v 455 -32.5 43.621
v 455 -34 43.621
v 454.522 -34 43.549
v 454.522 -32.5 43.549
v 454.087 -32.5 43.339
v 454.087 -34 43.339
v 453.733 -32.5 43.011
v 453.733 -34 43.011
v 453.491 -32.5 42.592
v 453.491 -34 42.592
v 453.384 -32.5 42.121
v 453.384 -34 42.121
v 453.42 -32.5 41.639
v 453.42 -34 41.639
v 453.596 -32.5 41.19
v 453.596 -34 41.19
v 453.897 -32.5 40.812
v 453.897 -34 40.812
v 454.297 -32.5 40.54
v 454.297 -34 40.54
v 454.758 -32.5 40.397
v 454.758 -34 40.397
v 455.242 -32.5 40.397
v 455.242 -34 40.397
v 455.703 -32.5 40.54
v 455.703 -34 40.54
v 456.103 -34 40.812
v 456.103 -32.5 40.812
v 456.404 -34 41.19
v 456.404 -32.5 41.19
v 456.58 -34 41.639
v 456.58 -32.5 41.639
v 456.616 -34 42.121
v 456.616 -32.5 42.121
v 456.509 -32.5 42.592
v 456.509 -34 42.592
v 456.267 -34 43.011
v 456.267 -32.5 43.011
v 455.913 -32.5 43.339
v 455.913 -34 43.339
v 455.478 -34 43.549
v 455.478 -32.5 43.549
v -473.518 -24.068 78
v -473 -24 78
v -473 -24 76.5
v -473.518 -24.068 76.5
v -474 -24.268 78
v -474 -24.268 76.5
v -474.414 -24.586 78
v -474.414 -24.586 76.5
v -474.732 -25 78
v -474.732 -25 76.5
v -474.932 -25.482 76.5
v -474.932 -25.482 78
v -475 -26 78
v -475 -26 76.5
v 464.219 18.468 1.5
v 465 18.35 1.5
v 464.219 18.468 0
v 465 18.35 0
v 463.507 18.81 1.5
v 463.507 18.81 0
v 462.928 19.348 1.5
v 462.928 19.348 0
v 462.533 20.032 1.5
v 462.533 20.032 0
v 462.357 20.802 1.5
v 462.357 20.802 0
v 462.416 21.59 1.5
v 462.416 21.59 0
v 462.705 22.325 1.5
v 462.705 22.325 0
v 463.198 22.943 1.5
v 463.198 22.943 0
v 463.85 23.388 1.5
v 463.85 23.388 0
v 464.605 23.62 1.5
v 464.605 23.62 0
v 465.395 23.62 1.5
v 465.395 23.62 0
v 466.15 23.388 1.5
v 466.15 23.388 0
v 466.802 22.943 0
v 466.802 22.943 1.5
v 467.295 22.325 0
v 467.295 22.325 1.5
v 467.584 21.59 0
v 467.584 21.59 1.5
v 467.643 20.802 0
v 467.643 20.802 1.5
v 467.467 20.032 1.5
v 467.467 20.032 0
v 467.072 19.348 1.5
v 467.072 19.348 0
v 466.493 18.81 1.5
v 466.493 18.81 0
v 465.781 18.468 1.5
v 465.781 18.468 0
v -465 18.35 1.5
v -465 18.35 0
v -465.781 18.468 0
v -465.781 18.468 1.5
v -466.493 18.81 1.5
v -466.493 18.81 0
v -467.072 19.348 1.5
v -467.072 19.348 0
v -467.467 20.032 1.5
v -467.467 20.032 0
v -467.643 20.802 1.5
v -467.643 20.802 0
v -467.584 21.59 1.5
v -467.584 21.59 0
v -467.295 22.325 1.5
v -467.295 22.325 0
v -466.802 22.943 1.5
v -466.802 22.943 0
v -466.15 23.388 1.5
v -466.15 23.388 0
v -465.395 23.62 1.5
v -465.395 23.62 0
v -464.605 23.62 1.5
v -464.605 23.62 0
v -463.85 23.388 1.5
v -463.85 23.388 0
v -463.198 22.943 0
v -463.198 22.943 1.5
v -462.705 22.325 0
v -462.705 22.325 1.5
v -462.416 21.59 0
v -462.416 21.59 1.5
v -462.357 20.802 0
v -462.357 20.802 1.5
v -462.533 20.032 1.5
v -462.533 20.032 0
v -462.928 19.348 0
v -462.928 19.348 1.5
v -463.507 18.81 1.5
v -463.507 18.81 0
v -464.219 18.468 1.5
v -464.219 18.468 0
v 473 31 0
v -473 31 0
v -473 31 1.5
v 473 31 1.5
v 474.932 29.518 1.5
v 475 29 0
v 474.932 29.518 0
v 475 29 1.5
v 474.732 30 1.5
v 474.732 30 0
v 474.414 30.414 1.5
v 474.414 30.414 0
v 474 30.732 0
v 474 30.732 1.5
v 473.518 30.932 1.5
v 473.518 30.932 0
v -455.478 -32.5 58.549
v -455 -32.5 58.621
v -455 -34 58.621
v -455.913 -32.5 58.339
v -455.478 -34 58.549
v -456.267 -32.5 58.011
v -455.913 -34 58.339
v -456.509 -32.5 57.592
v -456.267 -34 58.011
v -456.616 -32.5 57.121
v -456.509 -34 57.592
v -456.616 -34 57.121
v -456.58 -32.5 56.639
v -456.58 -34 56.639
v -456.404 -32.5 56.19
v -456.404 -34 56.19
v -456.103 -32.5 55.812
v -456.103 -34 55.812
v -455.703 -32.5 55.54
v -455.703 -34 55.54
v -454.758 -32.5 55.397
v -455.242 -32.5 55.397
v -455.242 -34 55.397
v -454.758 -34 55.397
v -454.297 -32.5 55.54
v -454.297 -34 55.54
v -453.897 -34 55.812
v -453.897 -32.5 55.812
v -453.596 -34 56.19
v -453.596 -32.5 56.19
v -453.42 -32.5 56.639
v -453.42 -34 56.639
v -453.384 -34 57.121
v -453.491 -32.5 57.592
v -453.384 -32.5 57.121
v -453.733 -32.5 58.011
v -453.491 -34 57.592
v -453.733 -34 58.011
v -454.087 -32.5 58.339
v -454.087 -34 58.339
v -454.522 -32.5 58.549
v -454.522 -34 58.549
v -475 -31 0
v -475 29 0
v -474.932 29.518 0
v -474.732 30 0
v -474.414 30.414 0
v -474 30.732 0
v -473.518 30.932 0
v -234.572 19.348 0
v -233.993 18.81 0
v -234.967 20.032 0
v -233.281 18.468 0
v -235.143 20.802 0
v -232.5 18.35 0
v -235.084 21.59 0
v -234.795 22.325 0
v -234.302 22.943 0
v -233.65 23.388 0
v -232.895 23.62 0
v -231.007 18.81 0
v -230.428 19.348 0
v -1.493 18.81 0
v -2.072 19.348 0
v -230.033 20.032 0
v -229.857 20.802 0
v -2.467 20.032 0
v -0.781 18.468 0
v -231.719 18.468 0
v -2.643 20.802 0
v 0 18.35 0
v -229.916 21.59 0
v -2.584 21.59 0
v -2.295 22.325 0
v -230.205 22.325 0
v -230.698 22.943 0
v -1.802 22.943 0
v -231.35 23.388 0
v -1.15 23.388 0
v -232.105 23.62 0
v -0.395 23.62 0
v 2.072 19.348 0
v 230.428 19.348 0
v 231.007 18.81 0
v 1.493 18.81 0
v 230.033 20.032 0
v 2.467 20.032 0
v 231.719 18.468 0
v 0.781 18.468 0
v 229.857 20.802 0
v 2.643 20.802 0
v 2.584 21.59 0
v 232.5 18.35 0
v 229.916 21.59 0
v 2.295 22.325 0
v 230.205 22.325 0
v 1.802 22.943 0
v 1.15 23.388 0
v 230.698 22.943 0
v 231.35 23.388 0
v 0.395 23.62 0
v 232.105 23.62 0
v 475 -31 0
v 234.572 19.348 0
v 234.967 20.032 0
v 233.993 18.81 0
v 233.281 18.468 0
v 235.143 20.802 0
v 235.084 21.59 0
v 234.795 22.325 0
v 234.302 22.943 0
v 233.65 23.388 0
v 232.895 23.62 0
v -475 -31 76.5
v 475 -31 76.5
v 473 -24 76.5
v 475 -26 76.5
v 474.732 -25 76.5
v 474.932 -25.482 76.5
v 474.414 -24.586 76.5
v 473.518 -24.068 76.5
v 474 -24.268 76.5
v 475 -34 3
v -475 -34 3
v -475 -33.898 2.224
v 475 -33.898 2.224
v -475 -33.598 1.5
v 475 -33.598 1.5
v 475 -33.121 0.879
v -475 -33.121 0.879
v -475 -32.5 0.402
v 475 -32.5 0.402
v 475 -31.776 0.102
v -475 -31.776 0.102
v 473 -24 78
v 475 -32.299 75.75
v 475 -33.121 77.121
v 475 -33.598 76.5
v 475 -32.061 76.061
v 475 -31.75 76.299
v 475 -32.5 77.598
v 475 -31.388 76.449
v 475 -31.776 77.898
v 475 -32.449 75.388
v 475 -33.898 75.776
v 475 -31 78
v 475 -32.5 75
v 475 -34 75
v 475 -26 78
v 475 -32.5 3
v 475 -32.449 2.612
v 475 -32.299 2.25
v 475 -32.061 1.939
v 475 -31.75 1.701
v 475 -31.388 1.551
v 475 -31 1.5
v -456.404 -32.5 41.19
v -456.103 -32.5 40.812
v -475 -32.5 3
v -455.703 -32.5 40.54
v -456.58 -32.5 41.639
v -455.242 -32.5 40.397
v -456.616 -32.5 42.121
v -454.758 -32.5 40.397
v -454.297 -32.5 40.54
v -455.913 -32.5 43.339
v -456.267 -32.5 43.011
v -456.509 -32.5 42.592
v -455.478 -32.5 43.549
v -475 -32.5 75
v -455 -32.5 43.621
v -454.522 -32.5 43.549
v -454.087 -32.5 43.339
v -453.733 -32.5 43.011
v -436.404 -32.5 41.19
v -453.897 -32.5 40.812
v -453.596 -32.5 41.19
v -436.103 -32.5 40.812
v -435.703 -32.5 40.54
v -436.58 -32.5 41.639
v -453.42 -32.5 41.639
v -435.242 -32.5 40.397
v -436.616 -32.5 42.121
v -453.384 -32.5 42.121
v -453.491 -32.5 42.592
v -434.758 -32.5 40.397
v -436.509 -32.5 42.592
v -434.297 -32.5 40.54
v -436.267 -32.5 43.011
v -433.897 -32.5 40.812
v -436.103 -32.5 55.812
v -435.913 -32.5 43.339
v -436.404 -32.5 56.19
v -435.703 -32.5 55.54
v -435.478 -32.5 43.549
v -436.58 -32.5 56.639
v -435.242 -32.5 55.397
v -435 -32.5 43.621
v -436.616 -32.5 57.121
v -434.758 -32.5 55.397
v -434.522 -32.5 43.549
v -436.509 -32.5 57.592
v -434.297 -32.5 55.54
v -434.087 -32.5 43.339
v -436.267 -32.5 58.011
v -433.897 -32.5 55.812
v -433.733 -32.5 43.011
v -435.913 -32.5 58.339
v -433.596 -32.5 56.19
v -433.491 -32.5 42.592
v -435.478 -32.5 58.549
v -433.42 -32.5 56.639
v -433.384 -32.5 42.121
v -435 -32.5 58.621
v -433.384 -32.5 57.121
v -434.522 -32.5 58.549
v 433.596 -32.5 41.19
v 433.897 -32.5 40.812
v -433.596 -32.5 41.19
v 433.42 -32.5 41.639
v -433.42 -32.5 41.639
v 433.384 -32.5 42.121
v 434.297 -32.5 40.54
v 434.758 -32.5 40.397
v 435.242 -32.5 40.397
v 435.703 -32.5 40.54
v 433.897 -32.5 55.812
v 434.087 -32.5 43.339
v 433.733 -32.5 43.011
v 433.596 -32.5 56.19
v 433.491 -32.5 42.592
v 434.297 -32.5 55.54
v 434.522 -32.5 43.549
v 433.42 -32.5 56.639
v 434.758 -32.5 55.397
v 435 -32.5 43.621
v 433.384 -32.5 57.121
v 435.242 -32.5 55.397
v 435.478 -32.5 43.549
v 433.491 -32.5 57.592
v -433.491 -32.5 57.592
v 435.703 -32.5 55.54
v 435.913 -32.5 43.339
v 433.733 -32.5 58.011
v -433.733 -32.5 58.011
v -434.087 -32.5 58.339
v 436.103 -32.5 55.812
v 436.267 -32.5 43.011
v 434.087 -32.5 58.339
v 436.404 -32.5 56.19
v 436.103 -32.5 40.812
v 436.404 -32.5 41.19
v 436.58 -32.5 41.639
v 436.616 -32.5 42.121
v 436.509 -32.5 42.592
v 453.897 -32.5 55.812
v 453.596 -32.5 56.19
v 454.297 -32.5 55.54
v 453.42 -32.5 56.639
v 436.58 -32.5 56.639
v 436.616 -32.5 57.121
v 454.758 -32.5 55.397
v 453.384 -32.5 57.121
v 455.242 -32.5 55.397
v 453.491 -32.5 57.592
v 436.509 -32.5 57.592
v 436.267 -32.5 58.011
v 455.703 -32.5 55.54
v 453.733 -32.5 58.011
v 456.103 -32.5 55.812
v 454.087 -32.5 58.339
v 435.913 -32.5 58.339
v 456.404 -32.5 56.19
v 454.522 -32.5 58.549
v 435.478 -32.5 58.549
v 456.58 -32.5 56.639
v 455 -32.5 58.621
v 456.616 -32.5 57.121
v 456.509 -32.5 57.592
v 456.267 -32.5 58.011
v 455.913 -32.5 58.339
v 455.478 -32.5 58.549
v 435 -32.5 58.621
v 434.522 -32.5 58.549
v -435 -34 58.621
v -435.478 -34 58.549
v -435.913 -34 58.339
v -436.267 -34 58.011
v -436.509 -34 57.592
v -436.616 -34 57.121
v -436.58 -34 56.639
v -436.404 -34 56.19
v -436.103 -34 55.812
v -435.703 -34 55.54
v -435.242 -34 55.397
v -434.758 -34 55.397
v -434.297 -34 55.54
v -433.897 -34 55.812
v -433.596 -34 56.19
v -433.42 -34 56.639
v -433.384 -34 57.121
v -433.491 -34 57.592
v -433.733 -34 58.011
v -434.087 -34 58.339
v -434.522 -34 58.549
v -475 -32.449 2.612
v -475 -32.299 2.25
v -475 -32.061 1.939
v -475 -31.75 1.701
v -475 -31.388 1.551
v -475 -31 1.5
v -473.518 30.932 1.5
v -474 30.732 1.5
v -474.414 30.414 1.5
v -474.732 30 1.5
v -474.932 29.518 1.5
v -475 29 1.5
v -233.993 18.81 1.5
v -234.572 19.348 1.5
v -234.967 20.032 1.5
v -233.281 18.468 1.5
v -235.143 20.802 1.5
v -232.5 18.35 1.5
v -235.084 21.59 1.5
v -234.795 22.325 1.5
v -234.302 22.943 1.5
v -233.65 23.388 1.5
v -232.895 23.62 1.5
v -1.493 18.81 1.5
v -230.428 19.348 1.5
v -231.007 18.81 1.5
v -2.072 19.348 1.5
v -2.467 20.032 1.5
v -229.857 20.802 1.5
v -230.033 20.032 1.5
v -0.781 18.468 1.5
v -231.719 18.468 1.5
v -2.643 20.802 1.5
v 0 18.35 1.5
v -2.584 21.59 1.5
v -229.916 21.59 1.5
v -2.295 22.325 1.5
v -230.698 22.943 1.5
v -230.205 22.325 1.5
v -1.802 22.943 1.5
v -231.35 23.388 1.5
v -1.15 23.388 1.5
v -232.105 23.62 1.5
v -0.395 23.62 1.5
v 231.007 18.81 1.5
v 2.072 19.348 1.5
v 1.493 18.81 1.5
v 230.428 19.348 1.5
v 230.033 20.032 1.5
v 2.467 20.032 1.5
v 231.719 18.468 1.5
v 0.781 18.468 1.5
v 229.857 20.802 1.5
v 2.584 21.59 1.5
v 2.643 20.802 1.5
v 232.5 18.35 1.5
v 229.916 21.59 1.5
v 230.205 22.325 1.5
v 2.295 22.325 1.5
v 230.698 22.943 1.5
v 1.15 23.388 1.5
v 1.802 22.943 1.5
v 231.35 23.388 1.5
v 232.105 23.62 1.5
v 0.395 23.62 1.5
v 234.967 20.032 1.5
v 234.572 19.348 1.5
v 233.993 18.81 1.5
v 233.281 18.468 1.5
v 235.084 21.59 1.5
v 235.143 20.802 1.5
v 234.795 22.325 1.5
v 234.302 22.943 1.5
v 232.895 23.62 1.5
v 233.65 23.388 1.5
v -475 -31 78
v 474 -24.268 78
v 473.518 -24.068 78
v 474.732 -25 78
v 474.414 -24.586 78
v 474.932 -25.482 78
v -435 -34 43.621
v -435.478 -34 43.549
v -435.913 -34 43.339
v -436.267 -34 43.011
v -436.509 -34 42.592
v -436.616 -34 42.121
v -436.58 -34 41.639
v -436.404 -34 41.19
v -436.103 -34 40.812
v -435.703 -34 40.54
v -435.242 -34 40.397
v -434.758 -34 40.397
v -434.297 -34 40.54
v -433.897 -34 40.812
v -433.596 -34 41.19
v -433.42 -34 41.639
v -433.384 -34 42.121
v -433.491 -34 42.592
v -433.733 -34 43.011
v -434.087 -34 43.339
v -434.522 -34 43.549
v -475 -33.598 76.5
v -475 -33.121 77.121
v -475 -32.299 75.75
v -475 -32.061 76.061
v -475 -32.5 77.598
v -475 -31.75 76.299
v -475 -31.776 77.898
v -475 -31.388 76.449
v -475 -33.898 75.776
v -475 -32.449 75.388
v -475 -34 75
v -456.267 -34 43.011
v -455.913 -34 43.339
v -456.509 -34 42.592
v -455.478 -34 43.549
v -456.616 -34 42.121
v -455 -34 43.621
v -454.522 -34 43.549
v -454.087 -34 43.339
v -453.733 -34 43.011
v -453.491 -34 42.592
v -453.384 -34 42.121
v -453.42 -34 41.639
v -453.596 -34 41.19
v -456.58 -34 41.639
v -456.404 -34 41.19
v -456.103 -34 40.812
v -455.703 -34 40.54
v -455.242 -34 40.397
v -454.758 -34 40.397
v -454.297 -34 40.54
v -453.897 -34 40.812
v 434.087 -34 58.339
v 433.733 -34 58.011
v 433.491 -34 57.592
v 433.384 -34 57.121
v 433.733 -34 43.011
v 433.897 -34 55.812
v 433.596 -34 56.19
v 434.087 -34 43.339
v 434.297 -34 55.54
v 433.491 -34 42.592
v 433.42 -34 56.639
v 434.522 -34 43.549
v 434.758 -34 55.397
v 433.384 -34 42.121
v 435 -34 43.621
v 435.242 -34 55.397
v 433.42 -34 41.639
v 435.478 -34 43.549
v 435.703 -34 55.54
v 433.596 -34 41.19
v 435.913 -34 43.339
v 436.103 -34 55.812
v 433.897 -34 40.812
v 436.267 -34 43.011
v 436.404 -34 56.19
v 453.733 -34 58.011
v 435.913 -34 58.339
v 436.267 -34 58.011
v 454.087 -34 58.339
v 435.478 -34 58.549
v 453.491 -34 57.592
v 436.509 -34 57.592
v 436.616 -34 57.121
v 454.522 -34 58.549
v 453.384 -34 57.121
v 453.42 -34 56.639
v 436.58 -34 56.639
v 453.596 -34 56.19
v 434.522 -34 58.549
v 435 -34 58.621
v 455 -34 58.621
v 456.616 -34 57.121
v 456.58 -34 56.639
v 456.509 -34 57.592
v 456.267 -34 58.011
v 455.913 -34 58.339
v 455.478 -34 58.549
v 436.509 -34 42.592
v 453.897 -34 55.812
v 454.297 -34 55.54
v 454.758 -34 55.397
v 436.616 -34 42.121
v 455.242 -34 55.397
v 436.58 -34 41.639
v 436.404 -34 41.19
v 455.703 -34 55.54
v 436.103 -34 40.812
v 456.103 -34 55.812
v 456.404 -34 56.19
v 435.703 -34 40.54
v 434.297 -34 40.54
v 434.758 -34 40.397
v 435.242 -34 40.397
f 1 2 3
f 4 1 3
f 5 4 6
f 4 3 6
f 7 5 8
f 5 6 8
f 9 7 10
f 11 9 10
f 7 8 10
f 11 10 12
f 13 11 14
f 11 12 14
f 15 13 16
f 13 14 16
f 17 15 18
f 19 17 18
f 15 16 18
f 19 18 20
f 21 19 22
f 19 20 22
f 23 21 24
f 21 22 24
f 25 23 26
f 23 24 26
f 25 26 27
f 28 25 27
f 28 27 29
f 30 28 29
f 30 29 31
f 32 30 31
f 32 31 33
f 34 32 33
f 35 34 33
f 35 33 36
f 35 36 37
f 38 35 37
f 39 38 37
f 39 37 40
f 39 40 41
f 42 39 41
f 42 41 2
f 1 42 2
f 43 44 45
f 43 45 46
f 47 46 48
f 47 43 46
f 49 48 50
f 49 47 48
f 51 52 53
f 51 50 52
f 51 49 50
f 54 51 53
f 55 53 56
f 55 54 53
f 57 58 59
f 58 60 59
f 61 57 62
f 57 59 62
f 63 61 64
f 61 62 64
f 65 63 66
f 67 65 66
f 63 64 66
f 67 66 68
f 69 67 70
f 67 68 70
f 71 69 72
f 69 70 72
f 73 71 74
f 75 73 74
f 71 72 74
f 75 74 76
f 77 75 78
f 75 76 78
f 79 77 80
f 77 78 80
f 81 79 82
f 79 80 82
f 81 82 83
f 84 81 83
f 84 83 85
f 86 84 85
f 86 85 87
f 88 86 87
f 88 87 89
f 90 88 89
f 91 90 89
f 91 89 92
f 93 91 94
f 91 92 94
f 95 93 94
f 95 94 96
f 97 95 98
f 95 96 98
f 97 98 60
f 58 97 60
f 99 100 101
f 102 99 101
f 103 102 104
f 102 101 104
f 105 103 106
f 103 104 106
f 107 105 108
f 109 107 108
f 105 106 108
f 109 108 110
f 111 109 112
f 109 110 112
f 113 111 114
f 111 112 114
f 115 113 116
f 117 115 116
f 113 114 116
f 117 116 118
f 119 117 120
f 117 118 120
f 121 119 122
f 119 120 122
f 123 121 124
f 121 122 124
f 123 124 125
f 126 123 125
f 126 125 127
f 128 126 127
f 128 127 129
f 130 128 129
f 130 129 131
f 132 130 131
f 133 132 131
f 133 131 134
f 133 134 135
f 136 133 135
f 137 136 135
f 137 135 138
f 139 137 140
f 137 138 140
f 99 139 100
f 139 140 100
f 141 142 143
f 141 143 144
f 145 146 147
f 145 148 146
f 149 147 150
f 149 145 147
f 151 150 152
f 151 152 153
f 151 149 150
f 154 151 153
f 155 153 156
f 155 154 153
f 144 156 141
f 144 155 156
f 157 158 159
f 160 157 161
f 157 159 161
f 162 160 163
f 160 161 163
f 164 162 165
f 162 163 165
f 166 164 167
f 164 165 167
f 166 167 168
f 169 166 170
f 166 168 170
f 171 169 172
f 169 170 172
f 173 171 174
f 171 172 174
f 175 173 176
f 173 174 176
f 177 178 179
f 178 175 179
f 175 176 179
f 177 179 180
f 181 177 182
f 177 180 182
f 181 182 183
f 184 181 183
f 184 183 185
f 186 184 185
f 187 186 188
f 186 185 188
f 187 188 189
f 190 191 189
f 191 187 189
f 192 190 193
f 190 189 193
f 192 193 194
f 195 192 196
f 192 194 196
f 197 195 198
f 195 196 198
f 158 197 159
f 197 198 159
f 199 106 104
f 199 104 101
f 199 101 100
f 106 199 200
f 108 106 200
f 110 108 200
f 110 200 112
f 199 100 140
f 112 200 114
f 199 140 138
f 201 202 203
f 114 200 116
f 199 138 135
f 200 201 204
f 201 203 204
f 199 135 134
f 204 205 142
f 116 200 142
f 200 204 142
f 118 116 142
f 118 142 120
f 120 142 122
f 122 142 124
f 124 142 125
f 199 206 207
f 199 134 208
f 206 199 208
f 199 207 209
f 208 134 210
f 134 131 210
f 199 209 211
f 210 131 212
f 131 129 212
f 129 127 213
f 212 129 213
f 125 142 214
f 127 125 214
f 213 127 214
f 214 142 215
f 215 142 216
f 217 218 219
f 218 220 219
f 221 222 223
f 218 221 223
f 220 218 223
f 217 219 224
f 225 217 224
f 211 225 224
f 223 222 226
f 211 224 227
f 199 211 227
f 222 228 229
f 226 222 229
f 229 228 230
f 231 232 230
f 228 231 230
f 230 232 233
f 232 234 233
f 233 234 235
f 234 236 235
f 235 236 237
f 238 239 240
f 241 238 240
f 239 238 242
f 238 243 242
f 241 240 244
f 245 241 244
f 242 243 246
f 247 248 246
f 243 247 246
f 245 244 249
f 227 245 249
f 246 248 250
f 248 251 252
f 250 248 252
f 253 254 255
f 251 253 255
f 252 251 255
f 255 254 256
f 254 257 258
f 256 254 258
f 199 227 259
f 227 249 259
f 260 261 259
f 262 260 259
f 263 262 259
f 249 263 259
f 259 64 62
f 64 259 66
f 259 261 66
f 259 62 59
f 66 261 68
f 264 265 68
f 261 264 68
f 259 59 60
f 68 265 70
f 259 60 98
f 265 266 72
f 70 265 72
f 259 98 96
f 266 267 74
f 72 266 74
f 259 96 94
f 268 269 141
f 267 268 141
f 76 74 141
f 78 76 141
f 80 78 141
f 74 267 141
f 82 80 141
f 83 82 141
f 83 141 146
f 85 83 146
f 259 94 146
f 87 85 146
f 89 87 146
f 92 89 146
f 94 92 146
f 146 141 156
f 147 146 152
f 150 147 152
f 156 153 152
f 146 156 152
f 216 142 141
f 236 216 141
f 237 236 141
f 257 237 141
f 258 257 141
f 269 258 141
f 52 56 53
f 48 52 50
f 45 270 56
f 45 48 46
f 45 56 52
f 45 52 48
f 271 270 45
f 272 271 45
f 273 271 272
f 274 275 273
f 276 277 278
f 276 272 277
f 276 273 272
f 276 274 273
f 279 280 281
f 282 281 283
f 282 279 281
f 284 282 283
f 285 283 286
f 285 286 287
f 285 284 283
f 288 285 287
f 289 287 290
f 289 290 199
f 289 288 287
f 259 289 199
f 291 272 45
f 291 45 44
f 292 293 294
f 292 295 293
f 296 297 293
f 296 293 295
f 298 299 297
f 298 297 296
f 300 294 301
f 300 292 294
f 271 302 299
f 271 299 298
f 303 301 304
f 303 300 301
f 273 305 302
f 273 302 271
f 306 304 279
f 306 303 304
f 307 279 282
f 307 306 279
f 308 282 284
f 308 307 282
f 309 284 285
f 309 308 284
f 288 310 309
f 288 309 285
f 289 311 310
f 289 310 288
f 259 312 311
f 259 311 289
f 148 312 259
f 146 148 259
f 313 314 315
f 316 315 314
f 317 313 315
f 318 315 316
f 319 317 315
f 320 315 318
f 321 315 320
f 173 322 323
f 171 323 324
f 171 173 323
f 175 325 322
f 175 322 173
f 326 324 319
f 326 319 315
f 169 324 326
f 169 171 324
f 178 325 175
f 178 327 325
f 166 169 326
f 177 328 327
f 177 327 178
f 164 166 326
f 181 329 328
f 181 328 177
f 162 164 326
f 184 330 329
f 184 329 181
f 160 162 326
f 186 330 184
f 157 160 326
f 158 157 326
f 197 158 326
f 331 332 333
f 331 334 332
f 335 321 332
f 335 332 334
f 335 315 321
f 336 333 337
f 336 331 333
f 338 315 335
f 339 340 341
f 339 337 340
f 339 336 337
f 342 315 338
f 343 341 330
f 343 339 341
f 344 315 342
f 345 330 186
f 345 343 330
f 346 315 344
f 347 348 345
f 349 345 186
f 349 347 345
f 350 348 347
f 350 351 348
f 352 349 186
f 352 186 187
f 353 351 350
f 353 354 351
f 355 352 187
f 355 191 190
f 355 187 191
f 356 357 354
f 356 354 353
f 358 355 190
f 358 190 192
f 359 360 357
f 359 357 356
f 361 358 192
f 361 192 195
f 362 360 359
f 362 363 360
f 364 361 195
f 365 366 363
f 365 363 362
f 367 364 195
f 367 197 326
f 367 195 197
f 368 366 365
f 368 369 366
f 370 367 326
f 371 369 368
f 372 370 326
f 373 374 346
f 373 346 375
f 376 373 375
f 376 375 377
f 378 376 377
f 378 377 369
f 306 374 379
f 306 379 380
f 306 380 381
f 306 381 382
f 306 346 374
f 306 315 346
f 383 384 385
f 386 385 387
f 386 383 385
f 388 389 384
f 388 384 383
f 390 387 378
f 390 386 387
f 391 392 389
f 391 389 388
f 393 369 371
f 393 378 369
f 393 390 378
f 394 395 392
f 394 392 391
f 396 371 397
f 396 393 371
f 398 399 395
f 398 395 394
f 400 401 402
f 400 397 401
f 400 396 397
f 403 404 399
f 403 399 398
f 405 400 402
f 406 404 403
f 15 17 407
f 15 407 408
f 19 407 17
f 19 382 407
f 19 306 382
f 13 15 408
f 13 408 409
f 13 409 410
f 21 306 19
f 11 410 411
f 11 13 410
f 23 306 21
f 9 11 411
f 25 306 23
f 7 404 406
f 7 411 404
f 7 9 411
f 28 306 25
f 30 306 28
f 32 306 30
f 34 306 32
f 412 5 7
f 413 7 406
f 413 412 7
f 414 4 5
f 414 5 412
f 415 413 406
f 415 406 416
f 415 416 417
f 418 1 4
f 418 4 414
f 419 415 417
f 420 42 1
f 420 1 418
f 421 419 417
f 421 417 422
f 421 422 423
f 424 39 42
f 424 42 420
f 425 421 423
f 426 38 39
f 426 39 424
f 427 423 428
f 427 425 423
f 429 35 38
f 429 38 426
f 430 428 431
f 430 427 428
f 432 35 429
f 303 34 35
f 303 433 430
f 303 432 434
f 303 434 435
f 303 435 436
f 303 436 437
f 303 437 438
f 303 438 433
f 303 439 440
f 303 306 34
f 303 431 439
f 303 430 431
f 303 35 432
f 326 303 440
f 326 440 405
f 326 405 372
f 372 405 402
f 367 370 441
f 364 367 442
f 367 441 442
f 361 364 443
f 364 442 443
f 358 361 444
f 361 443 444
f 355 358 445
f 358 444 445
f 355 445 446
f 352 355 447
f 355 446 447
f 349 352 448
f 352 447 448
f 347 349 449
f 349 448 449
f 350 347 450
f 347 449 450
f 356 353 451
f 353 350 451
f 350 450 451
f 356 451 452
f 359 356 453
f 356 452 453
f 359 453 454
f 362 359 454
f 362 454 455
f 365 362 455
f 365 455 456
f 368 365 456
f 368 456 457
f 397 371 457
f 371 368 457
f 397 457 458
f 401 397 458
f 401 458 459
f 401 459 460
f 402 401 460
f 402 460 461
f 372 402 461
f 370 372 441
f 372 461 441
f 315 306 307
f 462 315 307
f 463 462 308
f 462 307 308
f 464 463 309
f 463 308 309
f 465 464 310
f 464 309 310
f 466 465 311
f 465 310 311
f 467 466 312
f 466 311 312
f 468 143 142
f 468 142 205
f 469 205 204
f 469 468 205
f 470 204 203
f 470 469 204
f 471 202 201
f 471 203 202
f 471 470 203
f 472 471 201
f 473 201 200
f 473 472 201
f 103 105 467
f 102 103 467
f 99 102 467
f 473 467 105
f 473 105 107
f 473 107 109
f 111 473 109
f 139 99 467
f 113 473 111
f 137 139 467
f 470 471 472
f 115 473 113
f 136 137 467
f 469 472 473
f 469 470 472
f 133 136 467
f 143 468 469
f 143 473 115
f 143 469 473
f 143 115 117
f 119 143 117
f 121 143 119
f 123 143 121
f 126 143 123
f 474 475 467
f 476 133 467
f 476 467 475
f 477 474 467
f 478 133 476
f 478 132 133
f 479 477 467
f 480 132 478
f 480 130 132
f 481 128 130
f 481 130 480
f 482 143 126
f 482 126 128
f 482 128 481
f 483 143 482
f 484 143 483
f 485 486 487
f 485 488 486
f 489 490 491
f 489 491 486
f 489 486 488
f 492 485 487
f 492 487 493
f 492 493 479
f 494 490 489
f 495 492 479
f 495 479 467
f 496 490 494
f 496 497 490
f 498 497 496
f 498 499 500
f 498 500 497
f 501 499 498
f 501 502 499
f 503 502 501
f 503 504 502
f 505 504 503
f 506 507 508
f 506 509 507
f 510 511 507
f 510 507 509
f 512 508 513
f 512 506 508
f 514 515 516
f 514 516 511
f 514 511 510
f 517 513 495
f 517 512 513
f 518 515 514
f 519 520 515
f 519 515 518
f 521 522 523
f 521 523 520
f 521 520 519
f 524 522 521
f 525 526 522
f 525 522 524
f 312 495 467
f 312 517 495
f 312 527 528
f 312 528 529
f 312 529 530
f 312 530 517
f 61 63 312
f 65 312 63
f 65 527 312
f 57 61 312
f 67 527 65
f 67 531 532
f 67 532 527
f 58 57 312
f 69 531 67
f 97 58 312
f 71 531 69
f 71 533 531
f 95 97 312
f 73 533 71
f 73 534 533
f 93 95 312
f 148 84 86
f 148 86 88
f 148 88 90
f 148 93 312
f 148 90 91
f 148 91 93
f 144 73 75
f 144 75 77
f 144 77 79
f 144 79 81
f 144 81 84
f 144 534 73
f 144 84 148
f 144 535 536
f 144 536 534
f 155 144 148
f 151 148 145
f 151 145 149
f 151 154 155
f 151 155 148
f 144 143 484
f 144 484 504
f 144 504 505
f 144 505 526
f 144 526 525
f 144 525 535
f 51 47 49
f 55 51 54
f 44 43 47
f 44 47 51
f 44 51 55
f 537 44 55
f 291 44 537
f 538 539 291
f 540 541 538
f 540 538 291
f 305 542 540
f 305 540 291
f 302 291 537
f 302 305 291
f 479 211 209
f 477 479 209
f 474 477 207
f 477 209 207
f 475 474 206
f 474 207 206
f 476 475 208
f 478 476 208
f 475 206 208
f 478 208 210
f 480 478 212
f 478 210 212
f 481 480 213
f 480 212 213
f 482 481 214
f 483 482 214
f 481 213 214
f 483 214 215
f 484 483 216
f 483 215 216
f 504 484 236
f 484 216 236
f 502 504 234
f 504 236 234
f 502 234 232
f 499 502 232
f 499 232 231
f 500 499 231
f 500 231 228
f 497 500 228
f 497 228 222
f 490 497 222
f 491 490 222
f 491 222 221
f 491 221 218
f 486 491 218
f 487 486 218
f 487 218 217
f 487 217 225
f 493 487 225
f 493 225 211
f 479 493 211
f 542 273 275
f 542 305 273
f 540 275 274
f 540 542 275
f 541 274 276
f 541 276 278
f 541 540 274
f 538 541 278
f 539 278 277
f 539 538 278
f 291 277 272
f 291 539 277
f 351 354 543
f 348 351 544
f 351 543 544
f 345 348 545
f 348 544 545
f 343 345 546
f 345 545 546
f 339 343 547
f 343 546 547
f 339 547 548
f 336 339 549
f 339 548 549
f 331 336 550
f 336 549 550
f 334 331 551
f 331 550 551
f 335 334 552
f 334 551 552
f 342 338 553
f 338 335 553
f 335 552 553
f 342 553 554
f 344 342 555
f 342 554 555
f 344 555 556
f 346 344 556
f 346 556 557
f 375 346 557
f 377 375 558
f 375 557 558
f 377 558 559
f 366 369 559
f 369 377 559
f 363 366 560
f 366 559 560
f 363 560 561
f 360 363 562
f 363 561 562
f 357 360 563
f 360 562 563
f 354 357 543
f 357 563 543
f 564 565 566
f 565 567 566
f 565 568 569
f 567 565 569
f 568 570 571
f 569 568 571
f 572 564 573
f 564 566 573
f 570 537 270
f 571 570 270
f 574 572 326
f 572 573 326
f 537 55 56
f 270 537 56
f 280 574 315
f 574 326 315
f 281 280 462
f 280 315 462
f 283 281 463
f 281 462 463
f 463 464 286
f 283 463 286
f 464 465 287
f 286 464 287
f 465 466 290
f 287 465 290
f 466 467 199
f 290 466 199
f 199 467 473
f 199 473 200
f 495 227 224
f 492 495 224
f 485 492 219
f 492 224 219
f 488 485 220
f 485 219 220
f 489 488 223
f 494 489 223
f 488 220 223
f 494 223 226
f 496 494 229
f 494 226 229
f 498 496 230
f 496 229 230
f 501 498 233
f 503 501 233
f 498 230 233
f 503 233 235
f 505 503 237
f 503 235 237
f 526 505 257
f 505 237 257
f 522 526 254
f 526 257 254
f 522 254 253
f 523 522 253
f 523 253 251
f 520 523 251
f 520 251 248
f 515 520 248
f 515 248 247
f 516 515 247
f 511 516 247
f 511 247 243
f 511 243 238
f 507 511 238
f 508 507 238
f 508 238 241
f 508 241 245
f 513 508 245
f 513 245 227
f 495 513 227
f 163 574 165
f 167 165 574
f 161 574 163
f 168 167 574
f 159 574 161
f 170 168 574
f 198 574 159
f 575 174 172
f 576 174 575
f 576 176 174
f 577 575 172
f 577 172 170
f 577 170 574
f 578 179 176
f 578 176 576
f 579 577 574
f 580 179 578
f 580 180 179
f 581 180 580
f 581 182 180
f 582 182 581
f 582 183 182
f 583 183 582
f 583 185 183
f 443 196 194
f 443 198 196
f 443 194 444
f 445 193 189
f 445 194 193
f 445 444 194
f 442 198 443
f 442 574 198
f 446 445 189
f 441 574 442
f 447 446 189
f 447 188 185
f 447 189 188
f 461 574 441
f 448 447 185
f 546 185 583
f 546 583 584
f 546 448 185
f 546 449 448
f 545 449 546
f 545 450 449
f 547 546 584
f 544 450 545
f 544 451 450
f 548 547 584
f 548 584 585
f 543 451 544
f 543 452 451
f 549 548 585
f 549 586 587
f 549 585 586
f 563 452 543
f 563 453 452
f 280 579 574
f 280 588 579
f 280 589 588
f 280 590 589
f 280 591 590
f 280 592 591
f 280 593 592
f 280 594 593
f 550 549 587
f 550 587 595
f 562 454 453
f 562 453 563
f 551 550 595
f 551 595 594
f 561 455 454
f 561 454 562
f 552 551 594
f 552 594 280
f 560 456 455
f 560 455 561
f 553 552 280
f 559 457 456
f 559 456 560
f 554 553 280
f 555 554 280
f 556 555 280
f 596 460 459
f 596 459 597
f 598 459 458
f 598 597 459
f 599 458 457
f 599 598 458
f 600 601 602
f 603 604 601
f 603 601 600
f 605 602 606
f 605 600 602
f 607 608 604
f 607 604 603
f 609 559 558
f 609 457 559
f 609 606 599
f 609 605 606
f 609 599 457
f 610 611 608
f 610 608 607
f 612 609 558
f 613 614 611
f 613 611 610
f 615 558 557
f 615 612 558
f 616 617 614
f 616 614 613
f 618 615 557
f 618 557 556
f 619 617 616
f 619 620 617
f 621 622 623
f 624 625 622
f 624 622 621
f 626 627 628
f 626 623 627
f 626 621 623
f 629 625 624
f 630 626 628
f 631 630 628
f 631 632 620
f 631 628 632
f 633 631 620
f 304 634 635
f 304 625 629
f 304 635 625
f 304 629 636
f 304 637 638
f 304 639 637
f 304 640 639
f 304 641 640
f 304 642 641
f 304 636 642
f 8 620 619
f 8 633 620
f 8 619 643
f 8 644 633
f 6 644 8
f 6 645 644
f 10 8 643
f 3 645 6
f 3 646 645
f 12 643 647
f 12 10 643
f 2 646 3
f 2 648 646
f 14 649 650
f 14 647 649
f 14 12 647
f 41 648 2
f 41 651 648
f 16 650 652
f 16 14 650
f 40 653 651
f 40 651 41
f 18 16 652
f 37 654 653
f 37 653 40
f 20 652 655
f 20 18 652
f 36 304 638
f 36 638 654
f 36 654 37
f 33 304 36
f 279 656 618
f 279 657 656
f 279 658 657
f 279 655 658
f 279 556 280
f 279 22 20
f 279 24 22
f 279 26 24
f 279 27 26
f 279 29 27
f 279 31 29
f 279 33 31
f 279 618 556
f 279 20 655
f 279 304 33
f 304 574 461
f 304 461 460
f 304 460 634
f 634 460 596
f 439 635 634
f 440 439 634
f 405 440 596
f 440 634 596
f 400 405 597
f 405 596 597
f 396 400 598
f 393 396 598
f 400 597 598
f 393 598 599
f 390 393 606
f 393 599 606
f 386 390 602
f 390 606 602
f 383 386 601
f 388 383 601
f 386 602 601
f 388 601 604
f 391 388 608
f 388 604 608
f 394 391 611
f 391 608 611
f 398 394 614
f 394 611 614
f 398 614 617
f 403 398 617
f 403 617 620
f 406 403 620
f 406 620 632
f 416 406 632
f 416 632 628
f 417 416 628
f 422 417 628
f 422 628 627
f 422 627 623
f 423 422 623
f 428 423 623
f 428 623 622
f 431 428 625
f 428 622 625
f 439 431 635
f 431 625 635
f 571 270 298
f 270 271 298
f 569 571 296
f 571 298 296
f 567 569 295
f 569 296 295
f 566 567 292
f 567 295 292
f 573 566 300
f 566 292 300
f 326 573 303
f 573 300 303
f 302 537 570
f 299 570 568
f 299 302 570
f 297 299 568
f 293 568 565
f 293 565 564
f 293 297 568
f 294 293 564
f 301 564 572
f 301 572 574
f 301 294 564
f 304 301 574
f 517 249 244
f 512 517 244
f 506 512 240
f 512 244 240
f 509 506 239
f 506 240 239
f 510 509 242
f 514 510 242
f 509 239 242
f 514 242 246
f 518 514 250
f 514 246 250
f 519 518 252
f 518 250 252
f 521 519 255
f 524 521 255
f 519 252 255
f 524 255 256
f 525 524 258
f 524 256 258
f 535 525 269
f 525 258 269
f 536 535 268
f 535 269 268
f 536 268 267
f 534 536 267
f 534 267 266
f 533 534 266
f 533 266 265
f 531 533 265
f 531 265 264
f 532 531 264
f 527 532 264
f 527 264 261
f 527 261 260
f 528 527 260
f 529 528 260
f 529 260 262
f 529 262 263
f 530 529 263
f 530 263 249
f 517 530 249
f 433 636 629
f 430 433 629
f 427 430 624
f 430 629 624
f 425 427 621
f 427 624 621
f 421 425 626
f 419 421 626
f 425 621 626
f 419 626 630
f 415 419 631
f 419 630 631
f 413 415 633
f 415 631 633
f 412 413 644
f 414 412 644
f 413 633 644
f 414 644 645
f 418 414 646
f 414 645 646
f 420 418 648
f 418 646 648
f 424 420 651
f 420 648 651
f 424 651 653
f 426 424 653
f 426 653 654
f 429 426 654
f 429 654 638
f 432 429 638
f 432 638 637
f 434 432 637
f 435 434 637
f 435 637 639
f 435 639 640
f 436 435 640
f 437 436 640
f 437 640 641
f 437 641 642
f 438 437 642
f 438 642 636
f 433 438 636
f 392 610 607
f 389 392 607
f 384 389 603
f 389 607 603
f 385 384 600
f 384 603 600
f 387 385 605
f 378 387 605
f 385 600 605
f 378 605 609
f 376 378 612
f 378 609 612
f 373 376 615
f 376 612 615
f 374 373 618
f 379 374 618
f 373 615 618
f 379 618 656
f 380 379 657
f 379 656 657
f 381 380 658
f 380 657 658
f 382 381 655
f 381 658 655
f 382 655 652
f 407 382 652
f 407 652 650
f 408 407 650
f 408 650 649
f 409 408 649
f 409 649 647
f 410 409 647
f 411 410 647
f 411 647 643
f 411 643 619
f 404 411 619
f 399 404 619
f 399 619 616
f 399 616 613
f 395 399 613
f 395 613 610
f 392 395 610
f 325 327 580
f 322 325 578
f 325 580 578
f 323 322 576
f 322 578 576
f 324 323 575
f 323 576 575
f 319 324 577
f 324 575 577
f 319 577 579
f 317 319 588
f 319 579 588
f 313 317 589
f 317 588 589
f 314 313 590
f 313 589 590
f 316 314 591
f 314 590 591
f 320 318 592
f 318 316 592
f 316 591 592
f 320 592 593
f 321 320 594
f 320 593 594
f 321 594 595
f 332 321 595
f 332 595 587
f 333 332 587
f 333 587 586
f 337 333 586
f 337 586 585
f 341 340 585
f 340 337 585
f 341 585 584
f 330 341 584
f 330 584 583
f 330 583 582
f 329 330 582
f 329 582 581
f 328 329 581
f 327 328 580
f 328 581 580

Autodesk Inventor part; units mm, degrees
ref_plane "YZ Plane" through (0, 0, 0) normal (1, 0, 0) x (0, 1, 0)
ref_plane "XZ Plane" through (0, 0, 0) normal (0, 1, 0) x (-1, 0, 0)
ref_plane "XY Plane" through (0, 0, 0) normal (0, 0, 1) x (1, 0, 0)
sketch "スケッチ1" plane through (0, 0, 0) normal (0, 0, 1) x (1, 0, 0)
  line L0 (475, -31) -> (-475, -31)
  line L1 (-475, -31) -> (-475, 31)
  line L2 (-475, 31) -> (475, 31)
  line L3 (475, 31) -> (475, -31)
  line L4 (475, -31) -> (-475, 31) construction
  line L5 (-475, -31) -> (475, 31) construction
  point P0 (0, 0)
  dimension "d0" = 62
  dimension "d1" = 950
extrude "プレート1" add sketch "スケッチ1" along normal blind 1.5
sketch "スケッチ2" plane through (475, -32.5, 3) normal (0, -1, 0) x (1, 0, 0)
  line L0 (-950, 0) -> (0, 0)
  line L1 (0, 0) -> (0, 72)
  line L2 (0, 72) -> (-950, 72)
  line L3 (-950, 72) -> (-950, 0)
edge flange "フランジ1" height 75 angle 90 thickness 1.5 bend radius 1.5 thickness toward (0, -1, 0) relief tear relief width 1.5 relief depth 0.75 edges at (0, -31, 1.5) wall of the first edge with corners at (-475, -32.5, 3) (475, -32.5, 3) (475, -32.5, 75) (-475, -32.5, 75)
bend "曲げ1"
corner "コーナー1"
sketch "スケッチ3" plane through (475, -31, 76.5) normal (0, 0, 1) x (1, 0, 0)
  line L0 (-950, 0) -> (0, 0)
  line L1 (0, 0) -> (0, 7)
  line L2 (0, 7) -> (-950, 7)
  line L3 (-950, 7) -> (-950, 0)
edge flange "フランジ2" height 10 angle 90 thickness 1.5 bend radius 1.5 thickness toward (0, 0, 1) relief tear relief width 1.5 relief depth 0.75 edges at (0, -32.5, 75) wall of the first edge with corners at (-475, -31, 76.5) (475, -31, 76.5) (475, -24, 76.5) (-475, -24, 76.5)
bend "曲げ2"
corner "コーナー2"
sketch "スケッチ4" plane through (0, 0, 1.5) normal (0, 0, 1) x (1, 0, 0)
  line L0 (-475, -31) -> (-475, 31) projected
  line L1 (475, -31) -> (-475, -31) projected
  line L2 (475, 31) -> (475, -31) projected
  line L3 (-475, 31) -> (475, 31) projected
  line L4 (-465, 21) -> (465, 21)
  point P0 (0, 0)
  point P1 (-232.5, 21)
  point P2 (0, 21)
  point P3 (232.5, 21)
  dimension "d23" = 10
  dimension "d24" = 10
  dimension "d25" = 10
  dimension "d26" = 930
  dimension "d27" = 232.5
  dimension "d28" = 232.5
  dimension "d29" = 232.5
hole "穴1" at (-465, 21, 1.5) at (-232.5, 21, 1.5) at (0, 21, 1.5) at (232.5, 21, 1.5) at (465, 21, 1.5) direction (0, 0, -1) diameter 5.3 end through all
sketch "スケッチ5" plane through (-475, -32.5, 3) normal (0, 1, 0) x (1, 0, 0)
  line L0 (950, 0) -> (0, 0) projected
  line L1 (0, -72) -> (0, 0) projected
  line L2 (0, -72) -> (950, -72) projected
  line L3 (950, -72) -> (950, 0) projected
  line L4 (930, -54) -> (930, -39)
  line L5 (0, 1.5) -> (950, 1.5) projected
  line L6 (930, -54) -> (910, -54)
  line L7 (910, -54) -> (910, -39)
  line L8 (910, -39) -> (930, -39)
  line L9 (930, -39) -> (930, -54)
  point P0 (475, 3)
  point P1 (930, -46.5)
  dimension "d37" = 15
  dimension "d38" = 48
  dimension "d39" = 20
  dimension "d40" = 20
hole "穴2" at (455, -32.5, 57) at (455, -32.5, 42) at (435, -32.5, 57) at (435, -32.5, 42) direction (0, -1, 0) diameter 3.242 end through all thread size "M4x0.7" class "6H" standard "ISO Metric profile"
mirror "ミラー1" about plane through (0, 0, 0) normal (1, 0, 0) of "穴2"
fillet "フィレット1" radius 2 4 edges at (-475, 31, 0.75) (-475, -24, 77.25) (475, 31, 0.75) (475, -24, 77.25)
equation "\"d27\" = 0.25 * d26"
equation "\"d28\" = d27"
equation "\"d29\" = d27"
equation "\"d35\" = Thickness"
equation "\"d2\" = Thickness"
equation "\"d3\" = BendReliefWidth"
equation "\"d4\" = BendReliefDepth"
equation "\"d5\" = MinimumRemnant"
equation "\"d6\" = TransitionRadius"
equation "\"d9\" = BendRadius"
equation "\"d10\" = CornerReliefSize"
equation "\"d11\" = GapSize"
equation "\"d12\" = JacobiRadiusSize"
equation "\"d13\" = BendReliefWidth"
equation "\"d14\" = BendReliefDepth"
equation "\"d15\" = MinimumRemnant"
equation "\"d16\" = TransitionRadius"
equation "\"d19\" = BendRadius"
equation "\"d20\" = CornerReliefSize"
equation "\"d21\" = GapSize"
equation "\"d22\" = JacobiRadiusSize"
equation "\"BendRadius\" = Thickness"
equation "\"BendReliefWidth\" = Thickness"
equation "\"BendReliefDepth\" = 0.5 * Thickness"
equation "\"CornerReliefSize\" = 4 * Thickness"
equation "\"MinimumRemnant\" = 2 * Thickness"
equation "\"TransitionRadius\" = BendRadius"
equation "\"JacobiRadiusSize\" = BendRadius"
equation "\"GapSize\" = Thickness"
equation "\"Thickness\" = 1.5"
properties part number "DragChain_Guide_A"
